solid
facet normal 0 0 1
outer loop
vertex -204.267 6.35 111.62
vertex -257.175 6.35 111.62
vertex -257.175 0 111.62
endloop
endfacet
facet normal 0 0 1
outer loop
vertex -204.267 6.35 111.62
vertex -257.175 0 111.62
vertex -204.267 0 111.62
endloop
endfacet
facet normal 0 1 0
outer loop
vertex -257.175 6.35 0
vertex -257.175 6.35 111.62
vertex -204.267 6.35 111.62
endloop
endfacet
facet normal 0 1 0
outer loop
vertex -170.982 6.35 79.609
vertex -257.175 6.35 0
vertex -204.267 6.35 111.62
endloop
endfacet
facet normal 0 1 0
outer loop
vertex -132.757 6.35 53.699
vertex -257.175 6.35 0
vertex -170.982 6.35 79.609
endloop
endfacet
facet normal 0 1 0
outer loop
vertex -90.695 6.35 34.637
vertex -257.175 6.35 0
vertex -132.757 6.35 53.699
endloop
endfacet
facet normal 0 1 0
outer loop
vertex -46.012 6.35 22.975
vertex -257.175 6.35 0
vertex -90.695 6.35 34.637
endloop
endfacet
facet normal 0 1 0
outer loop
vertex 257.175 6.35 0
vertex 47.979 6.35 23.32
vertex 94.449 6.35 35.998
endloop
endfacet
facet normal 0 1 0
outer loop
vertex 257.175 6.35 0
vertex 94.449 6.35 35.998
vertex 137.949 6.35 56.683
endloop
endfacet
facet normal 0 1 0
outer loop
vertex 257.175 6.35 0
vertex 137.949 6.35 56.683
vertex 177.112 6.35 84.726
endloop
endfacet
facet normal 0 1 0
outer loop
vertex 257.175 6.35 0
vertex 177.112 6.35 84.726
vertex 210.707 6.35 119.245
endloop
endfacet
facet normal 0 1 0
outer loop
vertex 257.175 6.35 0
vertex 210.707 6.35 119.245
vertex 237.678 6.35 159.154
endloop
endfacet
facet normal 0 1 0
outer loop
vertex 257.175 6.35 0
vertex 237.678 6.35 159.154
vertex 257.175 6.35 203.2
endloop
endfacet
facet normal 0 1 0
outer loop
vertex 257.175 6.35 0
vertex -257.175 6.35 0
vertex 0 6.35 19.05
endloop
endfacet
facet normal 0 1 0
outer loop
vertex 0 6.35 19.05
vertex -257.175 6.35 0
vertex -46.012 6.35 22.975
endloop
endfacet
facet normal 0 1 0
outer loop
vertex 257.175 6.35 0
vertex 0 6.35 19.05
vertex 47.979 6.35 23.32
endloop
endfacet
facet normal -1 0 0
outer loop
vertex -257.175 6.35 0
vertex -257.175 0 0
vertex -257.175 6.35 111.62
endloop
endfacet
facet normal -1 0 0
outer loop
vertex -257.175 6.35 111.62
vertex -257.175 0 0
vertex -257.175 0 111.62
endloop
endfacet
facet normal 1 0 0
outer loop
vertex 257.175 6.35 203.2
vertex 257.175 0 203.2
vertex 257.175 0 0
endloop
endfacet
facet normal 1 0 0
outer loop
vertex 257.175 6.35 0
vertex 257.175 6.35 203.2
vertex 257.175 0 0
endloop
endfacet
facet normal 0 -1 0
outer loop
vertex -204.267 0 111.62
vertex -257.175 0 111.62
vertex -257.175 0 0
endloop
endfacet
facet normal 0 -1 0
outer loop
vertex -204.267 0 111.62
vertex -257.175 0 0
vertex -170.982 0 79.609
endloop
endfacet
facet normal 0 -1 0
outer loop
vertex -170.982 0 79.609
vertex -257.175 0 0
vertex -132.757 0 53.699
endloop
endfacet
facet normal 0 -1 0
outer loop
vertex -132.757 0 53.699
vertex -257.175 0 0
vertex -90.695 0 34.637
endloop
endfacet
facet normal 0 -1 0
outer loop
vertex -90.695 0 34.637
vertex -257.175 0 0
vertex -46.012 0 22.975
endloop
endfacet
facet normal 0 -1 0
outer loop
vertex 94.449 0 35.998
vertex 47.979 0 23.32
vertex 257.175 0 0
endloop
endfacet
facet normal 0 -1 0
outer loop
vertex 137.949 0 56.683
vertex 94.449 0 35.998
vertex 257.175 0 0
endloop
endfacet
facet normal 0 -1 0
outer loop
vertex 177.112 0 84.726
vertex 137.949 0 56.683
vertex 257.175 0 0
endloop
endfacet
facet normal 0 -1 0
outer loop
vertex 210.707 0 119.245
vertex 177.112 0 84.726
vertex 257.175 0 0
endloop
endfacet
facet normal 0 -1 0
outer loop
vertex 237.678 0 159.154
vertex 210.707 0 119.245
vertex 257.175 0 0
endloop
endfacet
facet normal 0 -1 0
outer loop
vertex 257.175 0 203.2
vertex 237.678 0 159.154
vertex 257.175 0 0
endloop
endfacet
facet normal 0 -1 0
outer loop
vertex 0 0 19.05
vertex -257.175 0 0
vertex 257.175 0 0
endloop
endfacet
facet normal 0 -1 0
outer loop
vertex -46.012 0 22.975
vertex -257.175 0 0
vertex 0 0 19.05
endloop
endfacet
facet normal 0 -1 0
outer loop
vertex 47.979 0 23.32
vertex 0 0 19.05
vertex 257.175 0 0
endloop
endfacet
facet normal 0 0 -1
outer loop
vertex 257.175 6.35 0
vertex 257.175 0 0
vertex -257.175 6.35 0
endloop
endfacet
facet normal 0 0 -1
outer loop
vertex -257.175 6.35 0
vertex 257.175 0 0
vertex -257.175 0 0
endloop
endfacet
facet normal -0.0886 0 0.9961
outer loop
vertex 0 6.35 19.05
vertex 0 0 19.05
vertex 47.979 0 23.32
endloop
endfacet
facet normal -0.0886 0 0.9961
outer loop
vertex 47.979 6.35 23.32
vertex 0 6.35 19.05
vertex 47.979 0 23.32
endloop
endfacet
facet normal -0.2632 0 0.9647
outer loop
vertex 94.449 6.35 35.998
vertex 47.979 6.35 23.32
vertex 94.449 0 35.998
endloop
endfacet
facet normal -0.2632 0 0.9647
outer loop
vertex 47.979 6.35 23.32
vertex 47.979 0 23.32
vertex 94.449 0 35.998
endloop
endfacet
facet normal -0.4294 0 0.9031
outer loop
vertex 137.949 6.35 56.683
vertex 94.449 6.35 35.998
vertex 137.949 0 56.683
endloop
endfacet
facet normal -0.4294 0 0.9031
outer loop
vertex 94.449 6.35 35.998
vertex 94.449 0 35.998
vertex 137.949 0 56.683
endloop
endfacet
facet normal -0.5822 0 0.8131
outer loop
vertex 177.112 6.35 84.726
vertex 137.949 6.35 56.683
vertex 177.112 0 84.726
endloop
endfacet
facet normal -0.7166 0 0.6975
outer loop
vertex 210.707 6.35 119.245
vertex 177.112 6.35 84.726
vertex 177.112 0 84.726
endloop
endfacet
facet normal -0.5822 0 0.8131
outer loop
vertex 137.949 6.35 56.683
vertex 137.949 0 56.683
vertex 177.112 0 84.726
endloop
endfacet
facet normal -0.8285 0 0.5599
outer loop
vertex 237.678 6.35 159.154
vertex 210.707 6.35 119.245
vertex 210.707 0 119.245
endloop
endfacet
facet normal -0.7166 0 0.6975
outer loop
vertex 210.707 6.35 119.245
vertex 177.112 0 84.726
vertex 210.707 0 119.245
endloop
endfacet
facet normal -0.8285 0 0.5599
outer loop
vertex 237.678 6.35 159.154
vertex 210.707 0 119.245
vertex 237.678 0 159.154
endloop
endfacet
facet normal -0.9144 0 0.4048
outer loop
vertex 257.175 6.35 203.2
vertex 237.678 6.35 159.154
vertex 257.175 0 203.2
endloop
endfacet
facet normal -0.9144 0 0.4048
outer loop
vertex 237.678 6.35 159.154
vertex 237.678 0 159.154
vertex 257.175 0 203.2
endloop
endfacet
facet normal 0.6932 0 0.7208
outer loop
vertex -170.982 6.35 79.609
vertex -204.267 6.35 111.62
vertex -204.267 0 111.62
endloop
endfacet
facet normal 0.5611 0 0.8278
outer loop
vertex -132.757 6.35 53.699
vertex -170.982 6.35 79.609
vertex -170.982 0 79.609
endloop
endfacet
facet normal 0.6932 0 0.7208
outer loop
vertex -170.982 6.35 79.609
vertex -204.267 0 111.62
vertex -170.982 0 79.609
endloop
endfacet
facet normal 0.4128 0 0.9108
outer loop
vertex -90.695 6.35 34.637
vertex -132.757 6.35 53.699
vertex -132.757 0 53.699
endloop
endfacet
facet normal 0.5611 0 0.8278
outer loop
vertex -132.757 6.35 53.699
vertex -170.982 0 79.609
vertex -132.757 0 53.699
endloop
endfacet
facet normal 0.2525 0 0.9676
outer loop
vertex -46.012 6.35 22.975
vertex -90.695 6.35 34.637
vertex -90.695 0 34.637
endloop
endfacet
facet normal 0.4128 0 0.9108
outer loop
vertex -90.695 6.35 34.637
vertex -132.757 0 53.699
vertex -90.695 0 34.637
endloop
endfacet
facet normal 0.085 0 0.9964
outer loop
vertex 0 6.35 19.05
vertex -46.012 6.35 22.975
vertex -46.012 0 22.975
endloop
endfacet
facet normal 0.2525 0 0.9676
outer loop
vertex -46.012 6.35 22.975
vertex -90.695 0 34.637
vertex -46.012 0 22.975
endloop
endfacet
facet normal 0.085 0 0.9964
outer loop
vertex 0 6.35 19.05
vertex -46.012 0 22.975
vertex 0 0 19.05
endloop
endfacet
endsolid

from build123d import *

# Parameters (mm, degrees)
BOSS_EXTRUDE1_DEPTH = 6.35
CUT_EXTRUDE1_DEPTH  = 328.825476626


with BuildPart() as part:
    # Sketch1 → Boss-Extrude1 (new body)
    with BuildSketch(Plane(origin=(0, 0, 0), x_dir=(1, 0, 0), z_dir=(0, 1, 0))):
        with BuildLine():
            Line((257.175, 0), (-257.175, 0))
            Line((-257.175, 0), (-257.175, -203.2))
            ThreePointArc((-257.175, -203.2), (-158.153567084, -69.834458038), (0, -19.05))
            ThreePointArc((0, -19.05), (158.153567084, -69.834458038), (257.175, -203.2))
            Line((257.175, -203.2), (257.175, 0))
        make_face()
    extrude(amount=BOSS_EXTRUDE1_DEPTH)

    # Sketch2 → Cut-Extrude1 (cut, through all)
    with BuildSketch(Plane(origin=(0, 6.35, 0), x_dir=(1, 0, 0), z_dir=(0, 1, 0))):
        with BuildLine():
            Line((-257.175, -111.6203), (-204.266839371, -111.6203))
            ThreePointArc((-204.266839371, -111.6203), (-235.22086035, -154.810408098), (-257.175, -203.2))
            Line((-257.175, -203.2), (-257.175, -111.6203))
        make_face()
    extrude(amount=-CUT_EXTRUDE1_DEPTH, mode=Mode.SUBTRACT)


solid = part.part
